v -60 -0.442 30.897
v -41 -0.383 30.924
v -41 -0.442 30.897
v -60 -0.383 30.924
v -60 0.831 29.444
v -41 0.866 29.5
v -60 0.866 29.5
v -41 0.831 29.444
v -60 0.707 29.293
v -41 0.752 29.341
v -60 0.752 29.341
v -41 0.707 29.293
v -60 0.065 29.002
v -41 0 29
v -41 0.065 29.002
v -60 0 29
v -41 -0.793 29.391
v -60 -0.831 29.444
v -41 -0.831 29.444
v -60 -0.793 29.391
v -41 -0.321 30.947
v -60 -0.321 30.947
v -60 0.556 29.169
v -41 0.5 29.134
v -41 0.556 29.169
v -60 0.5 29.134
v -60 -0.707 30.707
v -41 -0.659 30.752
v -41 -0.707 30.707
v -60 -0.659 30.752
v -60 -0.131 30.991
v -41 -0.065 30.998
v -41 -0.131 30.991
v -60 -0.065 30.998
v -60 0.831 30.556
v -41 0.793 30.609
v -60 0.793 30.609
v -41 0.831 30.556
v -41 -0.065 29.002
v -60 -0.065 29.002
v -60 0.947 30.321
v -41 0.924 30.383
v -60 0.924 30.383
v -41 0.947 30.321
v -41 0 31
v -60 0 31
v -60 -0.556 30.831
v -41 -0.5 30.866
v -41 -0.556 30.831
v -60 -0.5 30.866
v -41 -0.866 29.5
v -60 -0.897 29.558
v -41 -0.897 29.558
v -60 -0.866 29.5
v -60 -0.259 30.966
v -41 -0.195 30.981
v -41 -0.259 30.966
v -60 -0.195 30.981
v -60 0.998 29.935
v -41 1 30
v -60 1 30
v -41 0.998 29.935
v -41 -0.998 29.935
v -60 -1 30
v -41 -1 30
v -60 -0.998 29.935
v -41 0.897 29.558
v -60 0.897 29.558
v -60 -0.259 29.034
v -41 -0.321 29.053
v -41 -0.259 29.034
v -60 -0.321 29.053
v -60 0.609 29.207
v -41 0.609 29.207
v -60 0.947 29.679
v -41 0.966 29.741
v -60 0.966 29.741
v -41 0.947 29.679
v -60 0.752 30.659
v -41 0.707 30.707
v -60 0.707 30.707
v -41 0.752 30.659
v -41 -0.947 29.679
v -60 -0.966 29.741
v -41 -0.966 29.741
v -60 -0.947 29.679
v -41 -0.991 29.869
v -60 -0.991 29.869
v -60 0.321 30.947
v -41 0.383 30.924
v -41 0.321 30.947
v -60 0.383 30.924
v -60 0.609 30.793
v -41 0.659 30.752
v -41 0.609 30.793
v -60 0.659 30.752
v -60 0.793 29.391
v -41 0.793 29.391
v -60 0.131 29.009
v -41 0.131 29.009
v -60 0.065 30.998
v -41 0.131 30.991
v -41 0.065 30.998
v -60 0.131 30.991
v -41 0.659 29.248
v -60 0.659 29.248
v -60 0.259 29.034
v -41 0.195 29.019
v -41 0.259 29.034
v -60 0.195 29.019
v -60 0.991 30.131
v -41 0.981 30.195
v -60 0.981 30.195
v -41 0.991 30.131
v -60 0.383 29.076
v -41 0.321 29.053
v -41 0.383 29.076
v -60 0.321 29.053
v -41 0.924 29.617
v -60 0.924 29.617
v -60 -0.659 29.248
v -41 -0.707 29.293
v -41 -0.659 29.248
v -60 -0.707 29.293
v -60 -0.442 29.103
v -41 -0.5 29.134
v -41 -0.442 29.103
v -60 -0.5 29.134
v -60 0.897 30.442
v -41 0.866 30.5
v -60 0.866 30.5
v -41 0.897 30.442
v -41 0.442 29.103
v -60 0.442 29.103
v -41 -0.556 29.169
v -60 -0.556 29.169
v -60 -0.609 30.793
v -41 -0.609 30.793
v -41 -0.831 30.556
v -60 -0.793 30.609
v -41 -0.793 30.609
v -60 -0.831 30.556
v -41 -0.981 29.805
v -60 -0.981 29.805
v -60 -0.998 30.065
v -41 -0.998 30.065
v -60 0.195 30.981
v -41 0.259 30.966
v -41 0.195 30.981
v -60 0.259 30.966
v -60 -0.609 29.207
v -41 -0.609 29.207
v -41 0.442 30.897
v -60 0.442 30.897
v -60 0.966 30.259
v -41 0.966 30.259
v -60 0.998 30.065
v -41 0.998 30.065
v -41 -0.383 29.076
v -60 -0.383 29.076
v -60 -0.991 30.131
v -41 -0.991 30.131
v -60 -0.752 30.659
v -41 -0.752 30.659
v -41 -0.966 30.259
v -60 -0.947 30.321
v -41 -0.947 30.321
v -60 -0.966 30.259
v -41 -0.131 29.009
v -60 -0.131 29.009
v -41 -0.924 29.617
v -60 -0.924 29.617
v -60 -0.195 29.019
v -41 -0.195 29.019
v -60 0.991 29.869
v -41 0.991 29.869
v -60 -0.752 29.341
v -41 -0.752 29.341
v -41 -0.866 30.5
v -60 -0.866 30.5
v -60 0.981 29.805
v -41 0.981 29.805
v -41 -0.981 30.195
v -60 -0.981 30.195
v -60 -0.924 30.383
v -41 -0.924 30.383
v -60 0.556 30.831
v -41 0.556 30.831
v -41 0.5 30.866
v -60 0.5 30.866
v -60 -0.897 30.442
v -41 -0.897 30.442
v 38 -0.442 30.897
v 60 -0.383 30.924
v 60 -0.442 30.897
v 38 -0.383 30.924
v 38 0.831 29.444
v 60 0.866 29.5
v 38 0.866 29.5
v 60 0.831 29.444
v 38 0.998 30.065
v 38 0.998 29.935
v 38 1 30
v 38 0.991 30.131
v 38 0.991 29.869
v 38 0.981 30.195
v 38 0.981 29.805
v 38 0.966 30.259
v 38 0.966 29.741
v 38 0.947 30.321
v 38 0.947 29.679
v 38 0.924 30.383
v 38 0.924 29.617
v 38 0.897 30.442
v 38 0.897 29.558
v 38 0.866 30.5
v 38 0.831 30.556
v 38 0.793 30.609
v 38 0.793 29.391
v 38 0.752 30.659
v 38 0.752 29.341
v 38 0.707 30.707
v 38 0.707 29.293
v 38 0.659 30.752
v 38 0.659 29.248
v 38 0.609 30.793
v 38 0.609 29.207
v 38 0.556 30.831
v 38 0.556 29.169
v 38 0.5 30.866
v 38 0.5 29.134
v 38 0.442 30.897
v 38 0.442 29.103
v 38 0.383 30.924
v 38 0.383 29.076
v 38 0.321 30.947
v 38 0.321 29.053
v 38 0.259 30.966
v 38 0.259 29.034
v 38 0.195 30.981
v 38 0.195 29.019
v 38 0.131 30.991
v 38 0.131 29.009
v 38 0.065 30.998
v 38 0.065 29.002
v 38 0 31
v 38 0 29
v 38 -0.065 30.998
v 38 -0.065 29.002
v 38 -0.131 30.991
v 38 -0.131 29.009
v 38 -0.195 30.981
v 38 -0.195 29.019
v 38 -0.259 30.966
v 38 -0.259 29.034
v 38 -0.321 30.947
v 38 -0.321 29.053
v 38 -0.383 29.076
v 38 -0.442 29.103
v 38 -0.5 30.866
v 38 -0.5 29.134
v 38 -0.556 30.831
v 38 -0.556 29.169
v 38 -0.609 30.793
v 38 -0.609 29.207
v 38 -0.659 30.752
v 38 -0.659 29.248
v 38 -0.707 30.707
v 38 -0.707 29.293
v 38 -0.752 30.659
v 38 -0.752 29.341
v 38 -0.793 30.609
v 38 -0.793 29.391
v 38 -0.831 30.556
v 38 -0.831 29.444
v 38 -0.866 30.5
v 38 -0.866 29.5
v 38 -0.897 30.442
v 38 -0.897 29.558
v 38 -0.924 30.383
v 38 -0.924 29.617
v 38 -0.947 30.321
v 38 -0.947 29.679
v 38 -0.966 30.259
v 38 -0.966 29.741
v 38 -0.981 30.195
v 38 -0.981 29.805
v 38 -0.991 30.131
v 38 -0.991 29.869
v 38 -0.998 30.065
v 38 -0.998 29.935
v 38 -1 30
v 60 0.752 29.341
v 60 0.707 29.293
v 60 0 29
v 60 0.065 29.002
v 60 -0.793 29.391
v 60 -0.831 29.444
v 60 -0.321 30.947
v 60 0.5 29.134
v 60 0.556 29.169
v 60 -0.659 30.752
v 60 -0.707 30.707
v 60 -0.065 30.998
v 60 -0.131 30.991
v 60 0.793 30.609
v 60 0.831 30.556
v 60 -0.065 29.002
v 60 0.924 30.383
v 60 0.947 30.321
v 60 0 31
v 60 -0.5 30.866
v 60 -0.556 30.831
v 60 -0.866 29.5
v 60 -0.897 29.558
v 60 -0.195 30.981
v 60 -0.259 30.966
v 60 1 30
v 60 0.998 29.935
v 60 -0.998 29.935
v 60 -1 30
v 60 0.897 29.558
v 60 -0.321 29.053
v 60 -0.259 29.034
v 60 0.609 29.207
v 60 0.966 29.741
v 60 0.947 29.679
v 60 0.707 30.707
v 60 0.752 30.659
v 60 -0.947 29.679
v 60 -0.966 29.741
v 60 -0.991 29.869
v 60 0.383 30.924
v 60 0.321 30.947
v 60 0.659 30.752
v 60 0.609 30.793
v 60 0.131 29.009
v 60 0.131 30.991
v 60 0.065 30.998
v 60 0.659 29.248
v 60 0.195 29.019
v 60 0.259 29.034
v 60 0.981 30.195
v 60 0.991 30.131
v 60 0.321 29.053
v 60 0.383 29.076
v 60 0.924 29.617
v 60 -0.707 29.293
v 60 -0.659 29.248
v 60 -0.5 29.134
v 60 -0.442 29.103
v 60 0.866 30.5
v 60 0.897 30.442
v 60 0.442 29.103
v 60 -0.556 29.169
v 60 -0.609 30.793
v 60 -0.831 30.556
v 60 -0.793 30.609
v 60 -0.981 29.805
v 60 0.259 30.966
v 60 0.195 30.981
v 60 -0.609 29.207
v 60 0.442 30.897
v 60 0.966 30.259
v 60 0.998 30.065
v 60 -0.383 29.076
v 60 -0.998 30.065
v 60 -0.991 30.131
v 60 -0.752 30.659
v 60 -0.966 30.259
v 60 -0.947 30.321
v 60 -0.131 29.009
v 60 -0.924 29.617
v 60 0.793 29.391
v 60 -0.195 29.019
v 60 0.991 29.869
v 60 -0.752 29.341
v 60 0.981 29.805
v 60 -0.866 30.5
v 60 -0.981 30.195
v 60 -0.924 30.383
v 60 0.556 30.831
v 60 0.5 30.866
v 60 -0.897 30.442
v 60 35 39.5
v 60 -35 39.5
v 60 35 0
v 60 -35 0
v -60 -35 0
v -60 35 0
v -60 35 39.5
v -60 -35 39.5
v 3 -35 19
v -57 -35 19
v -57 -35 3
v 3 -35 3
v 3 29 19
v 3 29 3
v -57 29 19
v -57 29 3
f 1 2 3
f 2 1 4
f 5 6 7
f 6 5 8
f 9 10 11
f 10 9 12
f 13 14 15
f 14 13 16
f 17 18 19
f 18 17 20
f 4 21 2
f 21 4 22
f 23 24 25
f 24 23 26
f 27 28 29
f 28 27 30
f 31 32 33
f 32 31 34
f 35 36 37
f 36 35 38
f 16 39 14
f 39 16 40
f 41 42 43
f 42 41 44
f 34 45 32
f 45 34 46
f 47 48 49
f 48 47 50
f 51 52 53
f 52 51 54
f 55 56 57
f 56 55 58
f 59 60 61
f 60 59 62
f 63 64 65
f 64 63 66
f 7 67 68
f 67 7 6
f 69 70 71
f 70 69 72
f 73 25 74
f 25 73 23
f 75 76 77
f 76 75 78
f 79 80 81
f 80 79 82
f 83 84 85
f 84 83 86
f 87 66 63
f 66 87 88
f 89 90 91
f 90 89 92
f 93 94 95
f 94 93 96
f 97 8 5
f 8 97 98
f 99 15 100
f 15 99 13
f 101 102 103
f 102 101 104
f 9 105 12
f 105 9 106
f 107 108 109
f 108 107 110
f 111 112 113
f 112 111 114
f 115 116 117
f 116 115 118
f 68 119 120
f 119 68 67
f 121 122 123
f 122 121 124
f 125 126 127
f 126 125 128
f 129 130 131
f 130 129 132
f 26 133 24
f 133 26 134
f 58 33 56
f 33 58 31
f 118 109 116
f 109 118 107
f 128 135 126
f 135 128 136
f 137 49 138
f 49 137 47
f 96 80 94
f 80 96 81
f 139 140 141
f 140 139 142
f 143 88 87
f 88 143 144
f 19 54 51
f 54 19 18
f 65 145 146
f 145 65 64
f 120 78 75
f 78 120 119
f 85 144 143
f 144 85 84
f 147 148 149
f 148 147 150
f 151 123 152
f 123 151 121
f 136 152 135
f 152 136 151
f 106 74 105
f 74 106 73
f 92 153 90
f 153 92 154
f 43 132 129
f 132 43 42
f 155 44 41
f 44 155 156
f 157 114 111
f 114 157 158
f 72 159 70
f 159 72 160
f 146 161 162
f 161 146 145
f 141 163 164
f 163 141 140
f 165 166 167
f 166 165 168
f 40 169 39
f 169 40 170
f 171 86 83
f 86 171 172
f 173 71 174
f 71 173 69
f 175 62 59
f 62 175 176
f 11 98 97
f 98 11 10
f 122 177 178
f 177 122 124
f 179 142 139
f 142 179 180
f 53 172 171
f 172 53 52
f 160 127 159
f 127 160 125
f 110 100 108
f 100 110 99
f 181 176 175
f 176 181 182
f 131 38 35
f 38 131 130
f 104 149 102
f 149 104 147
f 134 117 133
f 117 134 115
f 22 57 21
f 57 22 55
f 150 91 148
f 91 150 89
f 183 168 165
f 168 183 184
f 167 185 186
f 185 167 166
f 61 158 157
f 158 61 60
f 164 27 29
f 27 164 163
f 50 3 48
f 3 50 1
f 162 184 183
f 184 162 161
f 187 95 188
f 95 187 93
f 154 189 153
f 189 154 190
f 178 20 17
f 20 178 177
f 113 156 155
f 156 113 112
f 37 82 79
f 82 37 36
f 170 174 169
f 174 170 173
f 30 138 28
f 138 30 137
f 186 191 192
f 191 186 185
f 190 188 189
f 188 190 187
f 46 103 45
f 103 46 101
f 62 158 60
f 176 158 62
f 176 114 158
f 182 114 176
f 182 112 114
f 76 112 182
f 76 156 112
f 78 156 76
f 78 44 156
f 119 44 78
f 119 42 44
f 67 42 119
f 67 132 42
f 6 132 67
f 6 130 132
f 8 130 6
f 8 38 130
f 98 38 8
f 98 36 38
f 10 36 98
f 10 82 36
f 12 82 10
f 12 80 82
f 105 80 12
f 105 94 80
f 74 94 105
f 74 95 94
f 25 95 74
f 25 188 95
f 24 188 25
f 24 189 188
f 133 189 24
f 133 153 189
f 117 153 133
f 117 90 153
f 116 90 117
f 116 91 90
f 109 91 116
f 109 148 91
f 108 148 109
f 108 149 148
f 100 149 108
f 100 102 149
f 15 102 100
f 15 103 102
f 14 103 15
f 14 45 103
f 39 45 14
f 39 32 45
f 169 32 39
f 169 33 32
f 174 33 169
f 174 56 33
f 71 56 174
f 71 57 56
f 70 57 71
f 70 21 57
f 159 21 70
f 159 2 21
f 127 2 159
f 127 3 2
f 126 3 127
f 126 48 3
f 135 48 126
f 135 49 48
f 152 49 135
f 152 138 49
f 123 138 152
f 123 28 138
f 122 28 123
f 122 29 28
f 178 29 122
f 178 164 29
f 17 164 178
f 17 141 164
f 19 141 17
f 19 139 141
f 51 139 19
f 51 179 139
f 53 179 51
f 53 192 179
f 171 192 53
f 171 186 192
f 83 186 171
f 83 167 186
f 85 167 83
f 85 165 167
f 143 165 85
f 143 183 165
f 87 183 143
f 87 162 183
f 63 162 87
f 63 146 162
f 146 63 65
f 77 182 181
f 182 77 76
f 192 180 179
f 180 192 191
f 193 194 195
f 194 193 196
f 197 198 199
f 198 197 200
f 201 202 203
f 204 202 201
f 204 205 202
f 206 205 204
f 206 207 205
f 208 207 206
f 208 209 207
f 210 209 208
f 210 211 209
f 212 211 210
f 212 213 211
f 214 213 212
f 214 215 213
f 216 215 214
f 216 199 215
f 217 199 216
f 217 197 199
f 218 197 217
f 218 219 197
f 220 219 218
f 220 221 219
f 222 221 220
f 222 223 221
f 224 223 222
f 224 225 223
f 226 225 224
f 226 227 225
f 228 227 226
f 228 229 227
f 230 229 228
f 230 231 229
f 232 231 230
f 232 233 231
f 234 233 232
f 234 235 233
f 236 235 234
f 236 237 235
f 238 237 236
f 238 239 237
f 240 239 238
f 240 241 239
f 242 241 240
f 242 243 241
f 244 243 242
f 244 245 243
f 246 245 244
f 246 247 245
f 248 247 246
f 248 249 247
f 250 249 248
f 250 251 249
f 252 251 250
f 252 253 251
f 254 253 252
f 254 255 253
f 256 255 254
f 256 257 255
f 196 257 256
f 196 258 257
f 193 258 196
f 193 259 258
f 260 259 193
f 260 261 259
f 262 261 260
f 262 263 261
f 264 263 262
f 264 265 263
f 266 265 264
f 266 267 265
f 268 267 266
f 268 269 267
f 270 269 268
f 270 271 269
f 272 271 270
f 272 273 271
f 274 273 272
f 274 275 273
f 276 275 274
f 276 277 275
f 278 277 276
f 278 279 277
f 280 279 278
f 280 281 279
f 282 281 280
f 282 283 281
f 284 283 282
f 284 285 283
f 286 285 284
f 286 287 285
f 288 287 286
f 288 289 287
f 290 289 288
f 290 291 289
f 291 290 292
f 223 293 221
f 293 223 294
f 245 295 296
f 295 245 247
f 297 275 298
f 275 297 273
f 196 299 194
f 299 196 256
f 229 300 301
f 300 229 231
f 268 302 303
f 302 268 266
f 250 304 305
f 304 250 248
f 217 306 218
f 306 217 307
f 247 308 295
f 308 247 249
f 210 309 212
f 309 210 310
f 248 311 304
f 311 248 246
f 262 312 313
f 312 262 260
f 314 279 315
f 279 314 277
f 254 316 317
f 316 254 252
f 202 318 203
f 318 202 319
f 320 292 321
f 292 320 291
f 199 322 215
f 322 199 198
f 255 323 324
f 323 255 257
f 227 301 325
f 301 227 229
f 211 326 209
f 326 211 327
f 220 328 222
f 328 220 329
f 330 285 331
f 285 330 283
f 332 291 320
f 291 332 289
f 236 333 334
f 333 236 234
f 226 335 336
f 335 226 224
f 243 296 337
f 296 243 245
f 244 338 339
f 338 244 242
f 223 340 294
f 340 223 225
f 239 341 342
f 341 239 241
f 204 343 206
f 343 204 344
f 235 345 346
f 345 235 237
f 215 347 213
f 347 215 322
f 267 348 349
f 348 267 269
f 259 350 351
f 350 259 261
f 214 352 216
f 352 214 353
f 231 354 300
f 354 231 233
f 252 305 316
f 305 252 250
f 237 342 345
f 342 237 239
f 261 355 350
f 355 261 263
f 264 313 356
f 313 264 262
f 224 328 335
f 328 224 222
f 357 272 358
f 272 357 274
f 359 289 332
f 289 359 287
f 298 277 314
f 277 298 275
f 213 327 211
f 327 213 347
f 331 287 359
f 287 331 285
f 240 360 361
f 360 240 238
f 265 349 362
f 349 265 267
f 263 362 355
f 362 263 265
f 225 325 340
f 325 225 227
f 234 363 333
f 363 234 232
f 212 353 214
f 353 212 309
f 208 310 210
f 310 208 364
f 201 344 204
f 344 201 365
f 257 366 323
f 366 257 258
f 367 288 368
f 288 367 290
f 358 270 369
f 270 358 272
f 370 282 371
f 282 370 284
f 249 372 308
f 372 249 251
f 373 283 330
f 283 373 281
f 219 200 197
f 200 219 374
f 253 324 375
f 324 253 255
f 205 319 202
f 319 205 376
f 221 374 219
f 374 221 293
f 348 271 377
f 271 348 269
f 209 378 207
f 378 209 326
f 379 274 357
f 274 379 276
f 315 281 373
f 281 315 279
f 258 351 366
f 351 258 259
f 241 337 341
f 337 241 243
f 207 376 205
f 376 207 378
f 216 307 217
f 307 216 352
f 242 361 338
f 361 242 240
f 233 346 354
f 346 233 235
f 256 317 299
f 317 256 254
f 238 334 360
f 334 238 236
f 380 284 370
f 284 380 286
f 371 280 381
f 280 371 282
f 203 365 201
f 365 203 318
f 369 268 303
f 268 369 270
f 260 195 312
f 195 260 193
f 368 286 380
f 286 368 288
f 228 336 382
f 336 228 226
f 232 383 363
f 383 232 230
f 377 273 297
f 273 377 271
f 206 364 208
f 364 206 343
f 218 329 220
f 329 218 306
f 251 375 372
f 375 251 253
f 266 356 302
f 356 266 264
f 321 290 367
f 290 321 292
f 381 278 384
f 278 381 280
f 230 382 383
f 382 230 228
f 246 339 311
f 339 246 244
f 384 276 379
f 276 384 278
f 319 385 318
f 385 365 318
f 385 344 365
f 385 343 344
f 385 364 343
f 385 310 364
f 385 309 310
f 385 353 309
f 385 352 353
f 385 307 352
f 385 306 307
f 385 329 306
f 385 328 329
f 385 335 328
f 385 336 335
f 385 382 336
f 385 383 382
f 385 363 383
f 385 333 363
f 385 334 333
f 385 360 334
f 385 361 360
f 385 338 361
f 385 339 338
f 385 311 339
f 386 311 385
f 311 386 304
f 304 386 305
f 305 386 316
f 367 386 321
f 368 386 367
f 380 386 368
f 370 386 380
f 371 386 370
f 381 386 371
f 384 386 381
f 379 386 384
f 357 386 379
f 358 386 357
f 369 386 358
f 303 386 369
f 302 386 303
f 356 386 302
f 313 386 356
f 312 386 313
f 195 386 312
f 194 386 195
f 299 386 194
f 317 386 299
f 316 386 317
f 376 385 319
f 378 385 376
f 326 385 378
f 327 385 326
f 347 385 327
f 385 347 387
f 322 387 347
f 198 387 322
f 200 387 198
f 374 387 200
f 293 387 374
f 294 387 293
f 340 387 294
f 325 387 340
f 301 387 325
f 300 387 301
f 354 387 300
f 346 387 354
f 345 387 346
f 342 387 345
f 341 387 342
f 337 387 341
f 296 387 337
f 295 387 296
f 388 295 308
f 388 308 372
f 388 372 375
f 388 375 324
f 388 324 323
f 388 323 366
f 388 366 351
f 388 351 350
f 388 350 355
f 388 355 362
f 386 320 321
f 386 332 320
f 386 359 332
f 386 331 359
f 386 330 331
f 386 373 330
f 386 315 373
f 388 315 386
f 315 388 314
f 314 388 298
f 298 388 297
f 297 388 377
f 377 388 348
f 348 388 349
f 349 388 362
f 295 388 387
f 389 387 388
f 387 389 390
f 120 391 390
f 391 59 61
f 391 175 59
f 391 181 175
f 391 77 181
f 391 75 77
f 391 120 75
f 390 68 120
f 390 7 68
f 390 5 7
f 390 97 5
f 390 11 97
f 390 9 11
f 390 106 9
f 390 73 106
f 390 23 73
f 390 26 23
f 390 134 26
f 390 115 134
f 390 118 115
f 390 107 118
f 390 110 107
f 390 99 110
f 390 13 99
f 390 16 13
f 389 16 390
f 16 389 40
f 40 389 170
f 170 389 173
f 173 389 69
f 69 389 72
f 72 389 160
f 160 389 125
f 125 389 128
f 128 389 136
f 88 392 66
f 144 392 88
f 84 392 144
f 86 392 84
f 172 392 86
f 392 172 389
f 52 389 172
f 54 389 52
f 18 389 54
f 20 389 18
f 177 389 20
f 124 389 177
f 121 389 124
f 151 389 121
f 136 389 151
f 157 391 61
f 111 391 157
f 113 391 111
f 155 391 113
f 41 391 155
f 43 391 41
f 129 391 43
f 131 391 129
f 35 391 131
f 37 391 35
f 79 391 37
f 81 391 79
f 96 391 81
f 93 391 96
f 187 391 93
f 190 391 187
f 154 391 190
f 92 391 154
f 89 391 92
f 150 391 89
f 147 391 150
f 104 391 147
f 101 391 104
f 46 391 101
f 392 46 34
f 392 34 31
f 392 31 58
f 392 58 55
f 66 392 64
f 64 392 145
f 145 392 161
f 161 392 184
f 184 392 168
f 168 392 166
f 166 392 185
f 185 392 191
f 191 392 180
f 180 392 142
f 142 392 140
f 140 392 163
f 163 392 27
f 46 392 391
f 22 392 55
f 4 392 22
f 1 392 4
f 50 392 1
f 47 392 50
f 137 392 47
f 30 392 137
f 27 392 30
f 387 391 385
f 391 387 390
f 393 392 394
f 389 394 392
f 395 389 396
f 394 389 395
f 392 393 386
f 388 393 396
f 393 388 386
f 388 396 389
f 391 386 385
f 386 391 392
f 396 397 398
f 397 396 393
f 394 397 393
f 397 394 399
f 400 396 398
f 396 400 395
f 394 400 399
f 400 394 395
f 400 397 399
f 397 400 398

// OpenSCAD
// Mini horizontal gel-electrophoresis buffer tank
// Print orientation: tank rests on XY plane at z = 0, open top at z = 40

// ---------- Parameters ----------
outer_x   = 120;   // outer length (X)
outer_y   = 70;    // outer width (Y)
outer_z   = 40;    // outer height (Z)
wall      = 3;     // wall thickness
floor     = 3;     // floor thickness
plat_top  = 13;    // top of raised platform above inner floor (z = 13)
plat_len  = 60;    // platform length in X, centred
hole_d    = 2;     // electrode hole diameter
hole_z    = 30;    // hole centre height (Z)
hole_y    = 0;     // hole centre Y position

eps       = 0.5;   // cutter overshoot past faces
$fn       = 96;    // curve resolution

// ---------- Derived ----------
inner_x   = outer_x - 2*wall;   // 114
inner_y   = outer_y - 2*wall;   // 64
inner_z   = outer_z - floor;    // 37 (inner floor at z = 3)
plat_h    = plat_top + floor;   // 16 (platform top at z = 16)

// ---------- Model ----------
difference() {
    // Main tank body, open top
    translate([-outer_x/2, -outer_y/2, 0])
        cube([outer_x, outer_y, outer_z]);

    // Open top (cut through the top face)
    translate([-outer_x/2, -outer_y/2, outer_z - eps])
        cube([outer_x, outer_y, eps]);

    // Raised platform for gel tray
    translate([-outer_x/2 + wall, -outer_y/2, floor])
        cube([plat_len, outer_y - 2*wall, plat_h]);

    // Horizontal electrode holes through each end wall along X
    for (s = [-1, 1])
        translate([s > 0 ? outer_x/2 - wall : -outer_x/2, hole_y, hole_z])
            rotate([0, 90, 0])
                cylinder(d = hole_d, h = outer_z - floor + 2*eps, center = true);
}
